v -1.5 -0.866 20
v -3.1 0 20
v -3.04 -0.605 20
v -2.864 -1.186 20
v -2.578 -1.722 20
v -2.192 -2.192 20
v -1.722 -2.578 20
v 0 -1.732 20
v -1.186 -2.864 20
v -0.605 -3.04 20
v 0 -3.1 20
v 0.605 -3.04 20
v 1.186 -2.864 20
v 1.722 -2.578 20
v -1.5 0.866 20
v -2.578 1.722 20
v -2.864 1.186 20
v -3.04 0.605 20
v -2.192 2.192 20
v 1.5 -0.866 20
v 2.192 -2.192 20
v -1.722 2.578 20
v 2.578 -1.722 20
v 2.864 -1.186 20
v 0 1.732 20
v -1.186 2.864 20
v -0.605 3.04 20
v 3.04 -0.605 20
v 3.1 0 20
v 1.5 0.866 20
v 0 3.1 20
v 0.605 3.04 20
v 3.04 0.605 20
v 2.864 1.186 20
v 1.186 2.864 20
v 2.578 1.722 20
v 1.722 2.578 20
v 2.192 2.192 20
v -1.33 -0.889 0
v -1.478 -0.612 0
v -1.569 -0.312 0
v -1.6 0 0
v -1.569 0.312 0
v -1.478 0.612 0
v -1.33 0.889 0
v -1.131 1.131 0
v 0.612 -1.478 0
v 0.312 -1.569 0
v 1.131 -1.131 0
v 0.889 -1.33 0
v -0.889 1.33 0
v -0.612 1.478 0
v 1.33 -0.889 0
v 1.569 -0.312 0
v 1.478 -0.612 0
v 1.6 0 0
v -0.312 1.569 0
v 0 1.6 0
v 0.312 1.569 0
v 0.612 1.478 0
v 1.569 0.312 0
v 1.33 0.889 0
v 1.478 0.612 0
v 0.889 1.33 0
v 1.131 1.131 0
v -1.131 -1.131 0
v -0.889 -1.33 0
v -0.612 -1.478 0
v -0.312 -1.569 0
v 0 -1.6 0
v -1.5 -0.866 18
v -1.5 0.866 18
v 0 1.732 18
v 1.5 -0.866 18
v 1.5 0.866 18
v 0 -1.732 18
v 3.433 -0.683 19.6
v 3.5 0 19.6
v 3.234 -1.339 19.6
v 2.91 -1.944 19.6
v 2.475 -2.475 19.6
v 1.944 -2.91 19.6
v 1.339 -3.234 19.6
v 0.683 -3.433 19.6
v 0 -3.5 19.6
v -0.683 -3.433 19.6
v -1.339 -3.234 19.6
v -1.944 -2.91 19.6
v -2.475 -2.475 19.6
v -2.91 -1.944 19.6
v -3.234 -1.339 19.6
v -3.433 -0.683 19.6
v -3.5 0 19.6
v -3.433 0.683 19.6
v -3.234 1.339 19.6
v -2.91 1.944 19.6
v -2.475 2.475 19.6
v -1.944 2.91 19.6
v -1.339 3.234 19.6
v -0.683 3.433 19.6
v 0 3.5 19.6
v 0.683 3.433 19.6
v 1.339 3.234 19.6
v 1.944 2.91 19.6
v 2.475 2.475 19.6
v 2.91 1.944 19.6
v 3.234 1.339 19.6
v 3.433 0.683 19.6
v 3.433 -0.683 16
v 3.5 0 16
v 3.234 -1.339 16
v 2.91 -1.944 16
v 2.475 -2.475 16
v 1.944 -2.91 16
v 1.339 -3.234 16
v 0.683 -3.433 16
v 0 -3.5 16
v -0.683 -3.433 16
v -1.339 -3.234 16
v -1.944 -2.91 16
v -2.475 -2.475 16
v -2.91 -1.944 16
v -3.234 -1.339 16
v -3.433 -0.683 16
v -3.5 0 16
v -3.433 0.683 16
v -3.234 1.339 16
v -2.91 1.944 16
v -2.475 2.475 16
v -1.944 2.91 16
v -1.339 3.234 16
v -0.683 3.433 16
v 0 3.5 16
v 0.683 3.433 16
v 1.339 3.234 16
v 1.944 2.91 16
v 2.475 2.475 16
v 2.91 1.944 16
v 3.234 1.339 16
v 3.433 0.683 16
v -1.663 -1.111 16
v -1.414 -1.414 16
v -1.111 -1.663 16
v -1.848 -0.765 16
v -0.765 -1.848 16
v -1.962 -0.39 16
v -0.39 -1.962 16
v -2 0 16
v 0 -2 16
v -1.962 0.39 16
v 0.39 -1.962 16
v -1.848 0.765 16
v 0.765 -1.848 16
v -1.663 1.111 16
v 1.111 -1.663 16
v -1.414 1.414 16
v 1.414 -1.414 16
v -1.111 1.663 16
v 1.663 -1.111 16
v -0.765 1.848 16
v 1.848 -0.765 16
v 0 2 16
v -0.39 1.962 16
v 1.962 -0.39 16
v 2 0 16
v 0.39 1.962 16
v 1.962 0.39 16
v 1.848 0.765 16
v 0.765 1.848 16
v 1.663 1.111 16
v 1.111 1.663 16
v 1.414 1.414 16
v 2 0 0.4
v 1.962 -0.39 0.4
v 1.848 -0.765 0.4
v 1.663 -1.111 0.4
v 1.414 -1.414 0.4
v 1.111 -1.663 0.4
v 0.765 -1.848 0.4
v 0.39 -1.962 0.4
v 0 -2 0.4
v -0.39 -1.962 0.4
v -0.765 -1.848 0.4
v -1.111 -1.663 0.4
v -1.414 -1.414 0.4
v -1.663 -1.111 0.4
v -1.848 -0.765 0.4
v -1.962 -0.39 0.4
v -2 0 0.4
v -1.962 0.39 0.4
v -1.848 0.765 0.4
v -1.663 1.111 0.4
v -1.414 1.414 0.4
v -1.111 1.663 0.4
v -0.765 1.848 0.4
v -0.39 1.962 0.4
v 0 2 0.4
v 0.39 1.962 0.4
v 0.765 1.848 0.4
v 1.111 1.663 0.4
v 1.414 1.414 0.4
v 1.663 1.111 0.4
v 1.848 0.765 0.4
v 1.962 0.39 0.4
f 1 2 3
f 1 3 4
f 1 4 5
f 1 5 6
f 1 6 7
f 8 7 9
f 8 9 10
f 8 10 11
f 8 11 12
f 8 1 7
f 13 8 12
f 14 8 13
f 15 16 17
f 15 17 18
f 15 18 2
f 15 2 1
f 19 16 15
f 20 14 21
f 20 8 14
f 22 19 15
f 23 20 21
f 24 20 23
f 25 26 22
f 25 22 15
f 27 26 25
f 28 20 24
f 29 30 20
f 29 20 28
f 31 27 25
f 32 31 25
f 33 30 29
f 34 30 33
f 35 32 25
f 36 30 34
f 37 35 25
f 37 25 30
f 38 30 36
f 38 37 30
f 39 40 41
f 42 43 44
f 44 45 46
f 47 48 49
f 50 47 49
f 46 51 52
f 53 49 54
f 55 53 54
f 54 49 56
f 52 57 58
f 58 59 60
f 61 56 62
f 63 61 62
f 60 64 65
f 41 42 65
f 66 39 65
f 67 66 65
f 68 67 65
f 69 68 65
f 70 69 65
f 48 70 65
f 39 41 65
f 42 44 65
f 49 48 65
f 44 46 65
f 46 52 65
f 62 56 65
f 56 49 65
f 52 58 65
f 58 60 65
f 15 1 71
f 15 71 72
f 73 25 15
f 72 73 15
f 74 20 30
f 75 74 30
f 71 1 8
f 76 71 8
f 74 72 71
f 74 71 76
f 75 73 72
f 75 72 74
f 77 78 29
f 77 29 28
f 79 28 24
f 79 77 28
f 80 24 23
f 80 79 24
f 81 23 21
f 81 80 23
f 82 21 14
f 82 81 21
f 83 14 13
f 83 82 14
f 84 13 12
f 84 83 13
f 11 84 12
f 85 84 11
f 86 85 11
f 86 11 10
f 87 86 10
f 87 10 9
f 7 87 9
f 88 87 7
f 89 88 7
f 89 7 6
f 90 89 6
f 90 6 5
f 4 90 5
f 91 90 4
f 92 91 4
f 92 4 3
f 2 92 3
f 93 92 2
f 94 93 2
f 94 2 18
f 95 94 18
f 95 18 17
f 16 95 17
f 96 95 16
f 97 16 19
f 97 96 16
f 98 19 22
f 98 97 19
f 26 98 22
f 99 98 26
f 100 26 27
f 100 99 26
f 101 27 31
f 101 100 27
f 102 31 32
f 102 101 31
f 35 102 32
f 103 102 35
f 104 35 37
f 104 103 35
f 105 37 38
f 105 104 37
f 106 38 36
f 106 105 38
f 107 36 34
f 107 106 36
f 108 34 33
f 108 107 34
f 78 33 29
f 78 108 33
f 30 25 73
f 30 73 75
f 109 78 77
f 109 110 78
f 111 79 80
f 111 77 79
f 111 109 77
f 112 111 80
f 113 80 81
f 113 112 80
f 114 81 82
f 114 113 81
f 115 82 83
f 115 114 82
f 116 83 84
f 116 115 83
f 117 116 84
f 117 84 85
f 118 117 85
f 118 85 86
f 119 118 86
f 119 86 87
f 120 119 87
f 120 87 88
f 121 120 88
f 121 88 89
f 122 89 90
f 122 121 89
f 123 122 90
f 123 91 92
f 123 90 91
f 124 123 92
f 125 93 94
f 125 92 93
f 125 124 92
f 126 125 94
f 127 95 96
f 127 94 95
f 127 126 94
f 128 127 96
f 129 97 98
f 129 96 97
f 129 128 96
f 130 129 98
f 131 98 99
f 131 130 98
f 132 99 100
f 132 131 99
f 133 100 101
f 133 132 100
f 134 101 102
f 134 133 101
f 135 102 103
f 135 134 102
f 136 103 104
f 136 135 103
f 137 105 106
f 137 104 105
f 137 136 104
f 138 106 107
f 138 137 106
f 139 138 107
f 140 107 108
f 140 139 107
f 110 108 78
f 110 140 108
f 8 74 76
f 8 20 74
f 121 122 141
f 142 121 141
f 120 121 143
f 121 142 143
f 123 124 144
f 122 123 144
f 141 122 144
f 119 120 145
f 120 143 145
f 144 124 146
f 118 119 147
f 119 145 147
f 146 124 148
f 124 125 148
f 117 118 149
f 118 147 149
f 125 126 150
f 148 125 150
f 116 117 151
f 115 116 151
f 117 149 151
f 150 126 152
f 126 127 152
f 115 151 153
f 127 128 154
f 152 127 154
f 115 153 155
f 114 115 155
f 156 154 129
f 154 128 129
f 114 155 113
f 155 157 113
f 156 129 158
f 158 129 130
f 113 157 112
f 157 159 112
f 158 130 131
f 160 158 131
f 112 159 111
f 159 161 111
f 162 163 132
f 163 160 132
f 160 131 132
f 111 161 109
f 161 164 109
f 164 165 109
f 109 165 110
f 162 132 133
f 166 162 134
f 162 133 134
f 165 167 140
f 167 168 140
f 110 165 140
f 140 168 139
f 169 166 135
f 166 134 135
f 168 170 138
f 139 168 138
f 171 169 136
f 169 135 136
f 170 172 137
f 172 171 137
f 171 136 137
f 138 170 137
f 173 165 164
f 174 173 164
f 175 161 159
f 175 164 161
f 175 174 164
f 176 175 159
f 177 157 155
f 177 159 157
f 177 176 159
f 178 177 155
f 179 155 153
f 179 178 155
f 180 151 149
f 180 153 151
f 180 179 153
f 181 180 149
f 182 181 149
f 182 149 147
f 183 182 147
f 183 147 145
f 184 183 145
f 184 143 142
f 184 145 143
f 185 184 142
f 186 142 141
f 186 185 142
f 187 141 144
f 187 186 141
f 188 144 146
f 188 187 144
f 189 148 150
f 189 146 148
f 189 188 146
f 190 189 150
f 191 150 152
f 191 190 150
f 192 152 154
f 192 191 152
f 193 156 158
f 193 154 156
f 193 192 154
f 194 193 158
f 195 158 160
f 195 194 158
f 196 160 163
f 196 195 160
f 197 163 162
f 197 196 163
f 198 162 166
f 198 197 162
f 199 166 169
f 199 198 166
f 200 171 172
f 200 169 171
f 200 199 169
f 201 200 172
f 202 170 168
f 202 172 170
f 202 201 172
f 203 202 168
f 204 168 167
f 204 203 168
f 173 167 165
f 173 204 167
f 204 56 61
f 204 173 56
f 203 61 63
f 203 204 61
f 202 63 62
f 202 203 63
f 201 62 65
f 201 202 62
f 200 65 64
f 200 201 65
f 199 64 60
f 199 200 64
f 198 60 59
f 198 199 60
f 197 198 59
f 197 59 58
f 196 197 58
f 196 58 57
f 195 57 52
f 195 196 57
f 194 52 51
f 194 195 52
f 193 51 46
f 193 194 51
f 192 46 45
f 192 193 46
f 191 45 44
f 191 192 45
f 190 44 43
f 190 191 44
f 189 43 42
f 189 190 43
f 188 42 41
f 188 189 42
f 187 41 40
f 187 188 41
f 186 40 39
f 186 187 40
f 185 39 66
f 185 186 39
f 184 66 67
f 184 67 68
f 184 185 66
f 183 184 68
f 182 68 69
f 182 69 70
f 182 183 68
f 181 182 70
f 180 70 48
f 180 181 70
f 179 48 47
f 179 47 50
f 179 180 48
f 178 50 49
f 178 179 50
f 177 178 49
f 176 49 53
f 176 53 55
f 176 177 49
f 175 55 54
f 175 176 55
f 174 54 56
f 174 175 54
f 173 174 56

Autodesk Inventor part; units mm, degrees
ref_plane "YZ Plane" through (0, 0, 0) normal (1, 0, 0) x (0, 1, 0)
ref_plane "XZ Plane" through (0, 0, 0) normal (0, 1, 0) x (-1, 0, 0)
ref_plane "XY Plane" through (0, 0, 0) normal (0, 0, 1) x (1, 0, 0)
sketch "Sketch1" plane through (0, 0, 0) normal (0, 0, 1) x (1, 0, 0)
  circle A0 centre (0, 0) radius 2
  dimension "Diameter" = 4
extrude "Extrusion1" add sketch "Sketch1" along normal blind 16
sketch "Sketch2" plane through (0, 0, 16) normal (0, 0, 1) x (1, 0, 0)
  circle A0 centre (0, 0) radius 2 projected
  circle A1 centre (0, 0) radius 3.5
  dimension "Head_Diameter" = 7
extrude "Extrusion2" add sketch "Sketch2" along normal blind 4 contours A0 | A1
sketch "Sketch3" plane through (0, 0, 20) normal (0, 0, 1) x (1, 0, 0)
  circle A0 centre (0, 0) radius 3.5 projected
  circle A1 centre (0, 0) radius 1.7321 construction
  line L0 (0, 1.7321) -> (1.5, 0.866)
  line L1 (1.5, -0.866) -> (1.5, 0.866)
  line L2 (0, 1.7321) -> (-1.5, 0.866)
  line L3 (-1.5, -0.866) -> (-1.5, 0.866)
  line L4 (-1.5, -0.866) -> (0, -1.7321)
  line L5 (1.5, -0.866) -> (0, -1.7321)
  dimension "Hex_Width" = 3
extrude "Extrusion3" cut sketch "Sketch3" against normal blind 2 contours L0 L1 L5 L4 L3 L2
thread "Thread1" size "M4x0.7" class "4g6g" standard "ANSI Metric M Profile" length 20
chamfer "Chamfer1" distance 0.4 angle 45 2 edges at (-3.5, 0, 20) (-2, 0, 0)
equation "\"d9\" = ThreadLength"
equation "\"d12\" = Chamfer"
equation "\"ThreadLength\" = 20"
equation "\"Chamfer\" = 0.4"
properties part number "SCREW, SOCKET HD, P, 12_9, M4X0_7X16" material "Steel, MS"
